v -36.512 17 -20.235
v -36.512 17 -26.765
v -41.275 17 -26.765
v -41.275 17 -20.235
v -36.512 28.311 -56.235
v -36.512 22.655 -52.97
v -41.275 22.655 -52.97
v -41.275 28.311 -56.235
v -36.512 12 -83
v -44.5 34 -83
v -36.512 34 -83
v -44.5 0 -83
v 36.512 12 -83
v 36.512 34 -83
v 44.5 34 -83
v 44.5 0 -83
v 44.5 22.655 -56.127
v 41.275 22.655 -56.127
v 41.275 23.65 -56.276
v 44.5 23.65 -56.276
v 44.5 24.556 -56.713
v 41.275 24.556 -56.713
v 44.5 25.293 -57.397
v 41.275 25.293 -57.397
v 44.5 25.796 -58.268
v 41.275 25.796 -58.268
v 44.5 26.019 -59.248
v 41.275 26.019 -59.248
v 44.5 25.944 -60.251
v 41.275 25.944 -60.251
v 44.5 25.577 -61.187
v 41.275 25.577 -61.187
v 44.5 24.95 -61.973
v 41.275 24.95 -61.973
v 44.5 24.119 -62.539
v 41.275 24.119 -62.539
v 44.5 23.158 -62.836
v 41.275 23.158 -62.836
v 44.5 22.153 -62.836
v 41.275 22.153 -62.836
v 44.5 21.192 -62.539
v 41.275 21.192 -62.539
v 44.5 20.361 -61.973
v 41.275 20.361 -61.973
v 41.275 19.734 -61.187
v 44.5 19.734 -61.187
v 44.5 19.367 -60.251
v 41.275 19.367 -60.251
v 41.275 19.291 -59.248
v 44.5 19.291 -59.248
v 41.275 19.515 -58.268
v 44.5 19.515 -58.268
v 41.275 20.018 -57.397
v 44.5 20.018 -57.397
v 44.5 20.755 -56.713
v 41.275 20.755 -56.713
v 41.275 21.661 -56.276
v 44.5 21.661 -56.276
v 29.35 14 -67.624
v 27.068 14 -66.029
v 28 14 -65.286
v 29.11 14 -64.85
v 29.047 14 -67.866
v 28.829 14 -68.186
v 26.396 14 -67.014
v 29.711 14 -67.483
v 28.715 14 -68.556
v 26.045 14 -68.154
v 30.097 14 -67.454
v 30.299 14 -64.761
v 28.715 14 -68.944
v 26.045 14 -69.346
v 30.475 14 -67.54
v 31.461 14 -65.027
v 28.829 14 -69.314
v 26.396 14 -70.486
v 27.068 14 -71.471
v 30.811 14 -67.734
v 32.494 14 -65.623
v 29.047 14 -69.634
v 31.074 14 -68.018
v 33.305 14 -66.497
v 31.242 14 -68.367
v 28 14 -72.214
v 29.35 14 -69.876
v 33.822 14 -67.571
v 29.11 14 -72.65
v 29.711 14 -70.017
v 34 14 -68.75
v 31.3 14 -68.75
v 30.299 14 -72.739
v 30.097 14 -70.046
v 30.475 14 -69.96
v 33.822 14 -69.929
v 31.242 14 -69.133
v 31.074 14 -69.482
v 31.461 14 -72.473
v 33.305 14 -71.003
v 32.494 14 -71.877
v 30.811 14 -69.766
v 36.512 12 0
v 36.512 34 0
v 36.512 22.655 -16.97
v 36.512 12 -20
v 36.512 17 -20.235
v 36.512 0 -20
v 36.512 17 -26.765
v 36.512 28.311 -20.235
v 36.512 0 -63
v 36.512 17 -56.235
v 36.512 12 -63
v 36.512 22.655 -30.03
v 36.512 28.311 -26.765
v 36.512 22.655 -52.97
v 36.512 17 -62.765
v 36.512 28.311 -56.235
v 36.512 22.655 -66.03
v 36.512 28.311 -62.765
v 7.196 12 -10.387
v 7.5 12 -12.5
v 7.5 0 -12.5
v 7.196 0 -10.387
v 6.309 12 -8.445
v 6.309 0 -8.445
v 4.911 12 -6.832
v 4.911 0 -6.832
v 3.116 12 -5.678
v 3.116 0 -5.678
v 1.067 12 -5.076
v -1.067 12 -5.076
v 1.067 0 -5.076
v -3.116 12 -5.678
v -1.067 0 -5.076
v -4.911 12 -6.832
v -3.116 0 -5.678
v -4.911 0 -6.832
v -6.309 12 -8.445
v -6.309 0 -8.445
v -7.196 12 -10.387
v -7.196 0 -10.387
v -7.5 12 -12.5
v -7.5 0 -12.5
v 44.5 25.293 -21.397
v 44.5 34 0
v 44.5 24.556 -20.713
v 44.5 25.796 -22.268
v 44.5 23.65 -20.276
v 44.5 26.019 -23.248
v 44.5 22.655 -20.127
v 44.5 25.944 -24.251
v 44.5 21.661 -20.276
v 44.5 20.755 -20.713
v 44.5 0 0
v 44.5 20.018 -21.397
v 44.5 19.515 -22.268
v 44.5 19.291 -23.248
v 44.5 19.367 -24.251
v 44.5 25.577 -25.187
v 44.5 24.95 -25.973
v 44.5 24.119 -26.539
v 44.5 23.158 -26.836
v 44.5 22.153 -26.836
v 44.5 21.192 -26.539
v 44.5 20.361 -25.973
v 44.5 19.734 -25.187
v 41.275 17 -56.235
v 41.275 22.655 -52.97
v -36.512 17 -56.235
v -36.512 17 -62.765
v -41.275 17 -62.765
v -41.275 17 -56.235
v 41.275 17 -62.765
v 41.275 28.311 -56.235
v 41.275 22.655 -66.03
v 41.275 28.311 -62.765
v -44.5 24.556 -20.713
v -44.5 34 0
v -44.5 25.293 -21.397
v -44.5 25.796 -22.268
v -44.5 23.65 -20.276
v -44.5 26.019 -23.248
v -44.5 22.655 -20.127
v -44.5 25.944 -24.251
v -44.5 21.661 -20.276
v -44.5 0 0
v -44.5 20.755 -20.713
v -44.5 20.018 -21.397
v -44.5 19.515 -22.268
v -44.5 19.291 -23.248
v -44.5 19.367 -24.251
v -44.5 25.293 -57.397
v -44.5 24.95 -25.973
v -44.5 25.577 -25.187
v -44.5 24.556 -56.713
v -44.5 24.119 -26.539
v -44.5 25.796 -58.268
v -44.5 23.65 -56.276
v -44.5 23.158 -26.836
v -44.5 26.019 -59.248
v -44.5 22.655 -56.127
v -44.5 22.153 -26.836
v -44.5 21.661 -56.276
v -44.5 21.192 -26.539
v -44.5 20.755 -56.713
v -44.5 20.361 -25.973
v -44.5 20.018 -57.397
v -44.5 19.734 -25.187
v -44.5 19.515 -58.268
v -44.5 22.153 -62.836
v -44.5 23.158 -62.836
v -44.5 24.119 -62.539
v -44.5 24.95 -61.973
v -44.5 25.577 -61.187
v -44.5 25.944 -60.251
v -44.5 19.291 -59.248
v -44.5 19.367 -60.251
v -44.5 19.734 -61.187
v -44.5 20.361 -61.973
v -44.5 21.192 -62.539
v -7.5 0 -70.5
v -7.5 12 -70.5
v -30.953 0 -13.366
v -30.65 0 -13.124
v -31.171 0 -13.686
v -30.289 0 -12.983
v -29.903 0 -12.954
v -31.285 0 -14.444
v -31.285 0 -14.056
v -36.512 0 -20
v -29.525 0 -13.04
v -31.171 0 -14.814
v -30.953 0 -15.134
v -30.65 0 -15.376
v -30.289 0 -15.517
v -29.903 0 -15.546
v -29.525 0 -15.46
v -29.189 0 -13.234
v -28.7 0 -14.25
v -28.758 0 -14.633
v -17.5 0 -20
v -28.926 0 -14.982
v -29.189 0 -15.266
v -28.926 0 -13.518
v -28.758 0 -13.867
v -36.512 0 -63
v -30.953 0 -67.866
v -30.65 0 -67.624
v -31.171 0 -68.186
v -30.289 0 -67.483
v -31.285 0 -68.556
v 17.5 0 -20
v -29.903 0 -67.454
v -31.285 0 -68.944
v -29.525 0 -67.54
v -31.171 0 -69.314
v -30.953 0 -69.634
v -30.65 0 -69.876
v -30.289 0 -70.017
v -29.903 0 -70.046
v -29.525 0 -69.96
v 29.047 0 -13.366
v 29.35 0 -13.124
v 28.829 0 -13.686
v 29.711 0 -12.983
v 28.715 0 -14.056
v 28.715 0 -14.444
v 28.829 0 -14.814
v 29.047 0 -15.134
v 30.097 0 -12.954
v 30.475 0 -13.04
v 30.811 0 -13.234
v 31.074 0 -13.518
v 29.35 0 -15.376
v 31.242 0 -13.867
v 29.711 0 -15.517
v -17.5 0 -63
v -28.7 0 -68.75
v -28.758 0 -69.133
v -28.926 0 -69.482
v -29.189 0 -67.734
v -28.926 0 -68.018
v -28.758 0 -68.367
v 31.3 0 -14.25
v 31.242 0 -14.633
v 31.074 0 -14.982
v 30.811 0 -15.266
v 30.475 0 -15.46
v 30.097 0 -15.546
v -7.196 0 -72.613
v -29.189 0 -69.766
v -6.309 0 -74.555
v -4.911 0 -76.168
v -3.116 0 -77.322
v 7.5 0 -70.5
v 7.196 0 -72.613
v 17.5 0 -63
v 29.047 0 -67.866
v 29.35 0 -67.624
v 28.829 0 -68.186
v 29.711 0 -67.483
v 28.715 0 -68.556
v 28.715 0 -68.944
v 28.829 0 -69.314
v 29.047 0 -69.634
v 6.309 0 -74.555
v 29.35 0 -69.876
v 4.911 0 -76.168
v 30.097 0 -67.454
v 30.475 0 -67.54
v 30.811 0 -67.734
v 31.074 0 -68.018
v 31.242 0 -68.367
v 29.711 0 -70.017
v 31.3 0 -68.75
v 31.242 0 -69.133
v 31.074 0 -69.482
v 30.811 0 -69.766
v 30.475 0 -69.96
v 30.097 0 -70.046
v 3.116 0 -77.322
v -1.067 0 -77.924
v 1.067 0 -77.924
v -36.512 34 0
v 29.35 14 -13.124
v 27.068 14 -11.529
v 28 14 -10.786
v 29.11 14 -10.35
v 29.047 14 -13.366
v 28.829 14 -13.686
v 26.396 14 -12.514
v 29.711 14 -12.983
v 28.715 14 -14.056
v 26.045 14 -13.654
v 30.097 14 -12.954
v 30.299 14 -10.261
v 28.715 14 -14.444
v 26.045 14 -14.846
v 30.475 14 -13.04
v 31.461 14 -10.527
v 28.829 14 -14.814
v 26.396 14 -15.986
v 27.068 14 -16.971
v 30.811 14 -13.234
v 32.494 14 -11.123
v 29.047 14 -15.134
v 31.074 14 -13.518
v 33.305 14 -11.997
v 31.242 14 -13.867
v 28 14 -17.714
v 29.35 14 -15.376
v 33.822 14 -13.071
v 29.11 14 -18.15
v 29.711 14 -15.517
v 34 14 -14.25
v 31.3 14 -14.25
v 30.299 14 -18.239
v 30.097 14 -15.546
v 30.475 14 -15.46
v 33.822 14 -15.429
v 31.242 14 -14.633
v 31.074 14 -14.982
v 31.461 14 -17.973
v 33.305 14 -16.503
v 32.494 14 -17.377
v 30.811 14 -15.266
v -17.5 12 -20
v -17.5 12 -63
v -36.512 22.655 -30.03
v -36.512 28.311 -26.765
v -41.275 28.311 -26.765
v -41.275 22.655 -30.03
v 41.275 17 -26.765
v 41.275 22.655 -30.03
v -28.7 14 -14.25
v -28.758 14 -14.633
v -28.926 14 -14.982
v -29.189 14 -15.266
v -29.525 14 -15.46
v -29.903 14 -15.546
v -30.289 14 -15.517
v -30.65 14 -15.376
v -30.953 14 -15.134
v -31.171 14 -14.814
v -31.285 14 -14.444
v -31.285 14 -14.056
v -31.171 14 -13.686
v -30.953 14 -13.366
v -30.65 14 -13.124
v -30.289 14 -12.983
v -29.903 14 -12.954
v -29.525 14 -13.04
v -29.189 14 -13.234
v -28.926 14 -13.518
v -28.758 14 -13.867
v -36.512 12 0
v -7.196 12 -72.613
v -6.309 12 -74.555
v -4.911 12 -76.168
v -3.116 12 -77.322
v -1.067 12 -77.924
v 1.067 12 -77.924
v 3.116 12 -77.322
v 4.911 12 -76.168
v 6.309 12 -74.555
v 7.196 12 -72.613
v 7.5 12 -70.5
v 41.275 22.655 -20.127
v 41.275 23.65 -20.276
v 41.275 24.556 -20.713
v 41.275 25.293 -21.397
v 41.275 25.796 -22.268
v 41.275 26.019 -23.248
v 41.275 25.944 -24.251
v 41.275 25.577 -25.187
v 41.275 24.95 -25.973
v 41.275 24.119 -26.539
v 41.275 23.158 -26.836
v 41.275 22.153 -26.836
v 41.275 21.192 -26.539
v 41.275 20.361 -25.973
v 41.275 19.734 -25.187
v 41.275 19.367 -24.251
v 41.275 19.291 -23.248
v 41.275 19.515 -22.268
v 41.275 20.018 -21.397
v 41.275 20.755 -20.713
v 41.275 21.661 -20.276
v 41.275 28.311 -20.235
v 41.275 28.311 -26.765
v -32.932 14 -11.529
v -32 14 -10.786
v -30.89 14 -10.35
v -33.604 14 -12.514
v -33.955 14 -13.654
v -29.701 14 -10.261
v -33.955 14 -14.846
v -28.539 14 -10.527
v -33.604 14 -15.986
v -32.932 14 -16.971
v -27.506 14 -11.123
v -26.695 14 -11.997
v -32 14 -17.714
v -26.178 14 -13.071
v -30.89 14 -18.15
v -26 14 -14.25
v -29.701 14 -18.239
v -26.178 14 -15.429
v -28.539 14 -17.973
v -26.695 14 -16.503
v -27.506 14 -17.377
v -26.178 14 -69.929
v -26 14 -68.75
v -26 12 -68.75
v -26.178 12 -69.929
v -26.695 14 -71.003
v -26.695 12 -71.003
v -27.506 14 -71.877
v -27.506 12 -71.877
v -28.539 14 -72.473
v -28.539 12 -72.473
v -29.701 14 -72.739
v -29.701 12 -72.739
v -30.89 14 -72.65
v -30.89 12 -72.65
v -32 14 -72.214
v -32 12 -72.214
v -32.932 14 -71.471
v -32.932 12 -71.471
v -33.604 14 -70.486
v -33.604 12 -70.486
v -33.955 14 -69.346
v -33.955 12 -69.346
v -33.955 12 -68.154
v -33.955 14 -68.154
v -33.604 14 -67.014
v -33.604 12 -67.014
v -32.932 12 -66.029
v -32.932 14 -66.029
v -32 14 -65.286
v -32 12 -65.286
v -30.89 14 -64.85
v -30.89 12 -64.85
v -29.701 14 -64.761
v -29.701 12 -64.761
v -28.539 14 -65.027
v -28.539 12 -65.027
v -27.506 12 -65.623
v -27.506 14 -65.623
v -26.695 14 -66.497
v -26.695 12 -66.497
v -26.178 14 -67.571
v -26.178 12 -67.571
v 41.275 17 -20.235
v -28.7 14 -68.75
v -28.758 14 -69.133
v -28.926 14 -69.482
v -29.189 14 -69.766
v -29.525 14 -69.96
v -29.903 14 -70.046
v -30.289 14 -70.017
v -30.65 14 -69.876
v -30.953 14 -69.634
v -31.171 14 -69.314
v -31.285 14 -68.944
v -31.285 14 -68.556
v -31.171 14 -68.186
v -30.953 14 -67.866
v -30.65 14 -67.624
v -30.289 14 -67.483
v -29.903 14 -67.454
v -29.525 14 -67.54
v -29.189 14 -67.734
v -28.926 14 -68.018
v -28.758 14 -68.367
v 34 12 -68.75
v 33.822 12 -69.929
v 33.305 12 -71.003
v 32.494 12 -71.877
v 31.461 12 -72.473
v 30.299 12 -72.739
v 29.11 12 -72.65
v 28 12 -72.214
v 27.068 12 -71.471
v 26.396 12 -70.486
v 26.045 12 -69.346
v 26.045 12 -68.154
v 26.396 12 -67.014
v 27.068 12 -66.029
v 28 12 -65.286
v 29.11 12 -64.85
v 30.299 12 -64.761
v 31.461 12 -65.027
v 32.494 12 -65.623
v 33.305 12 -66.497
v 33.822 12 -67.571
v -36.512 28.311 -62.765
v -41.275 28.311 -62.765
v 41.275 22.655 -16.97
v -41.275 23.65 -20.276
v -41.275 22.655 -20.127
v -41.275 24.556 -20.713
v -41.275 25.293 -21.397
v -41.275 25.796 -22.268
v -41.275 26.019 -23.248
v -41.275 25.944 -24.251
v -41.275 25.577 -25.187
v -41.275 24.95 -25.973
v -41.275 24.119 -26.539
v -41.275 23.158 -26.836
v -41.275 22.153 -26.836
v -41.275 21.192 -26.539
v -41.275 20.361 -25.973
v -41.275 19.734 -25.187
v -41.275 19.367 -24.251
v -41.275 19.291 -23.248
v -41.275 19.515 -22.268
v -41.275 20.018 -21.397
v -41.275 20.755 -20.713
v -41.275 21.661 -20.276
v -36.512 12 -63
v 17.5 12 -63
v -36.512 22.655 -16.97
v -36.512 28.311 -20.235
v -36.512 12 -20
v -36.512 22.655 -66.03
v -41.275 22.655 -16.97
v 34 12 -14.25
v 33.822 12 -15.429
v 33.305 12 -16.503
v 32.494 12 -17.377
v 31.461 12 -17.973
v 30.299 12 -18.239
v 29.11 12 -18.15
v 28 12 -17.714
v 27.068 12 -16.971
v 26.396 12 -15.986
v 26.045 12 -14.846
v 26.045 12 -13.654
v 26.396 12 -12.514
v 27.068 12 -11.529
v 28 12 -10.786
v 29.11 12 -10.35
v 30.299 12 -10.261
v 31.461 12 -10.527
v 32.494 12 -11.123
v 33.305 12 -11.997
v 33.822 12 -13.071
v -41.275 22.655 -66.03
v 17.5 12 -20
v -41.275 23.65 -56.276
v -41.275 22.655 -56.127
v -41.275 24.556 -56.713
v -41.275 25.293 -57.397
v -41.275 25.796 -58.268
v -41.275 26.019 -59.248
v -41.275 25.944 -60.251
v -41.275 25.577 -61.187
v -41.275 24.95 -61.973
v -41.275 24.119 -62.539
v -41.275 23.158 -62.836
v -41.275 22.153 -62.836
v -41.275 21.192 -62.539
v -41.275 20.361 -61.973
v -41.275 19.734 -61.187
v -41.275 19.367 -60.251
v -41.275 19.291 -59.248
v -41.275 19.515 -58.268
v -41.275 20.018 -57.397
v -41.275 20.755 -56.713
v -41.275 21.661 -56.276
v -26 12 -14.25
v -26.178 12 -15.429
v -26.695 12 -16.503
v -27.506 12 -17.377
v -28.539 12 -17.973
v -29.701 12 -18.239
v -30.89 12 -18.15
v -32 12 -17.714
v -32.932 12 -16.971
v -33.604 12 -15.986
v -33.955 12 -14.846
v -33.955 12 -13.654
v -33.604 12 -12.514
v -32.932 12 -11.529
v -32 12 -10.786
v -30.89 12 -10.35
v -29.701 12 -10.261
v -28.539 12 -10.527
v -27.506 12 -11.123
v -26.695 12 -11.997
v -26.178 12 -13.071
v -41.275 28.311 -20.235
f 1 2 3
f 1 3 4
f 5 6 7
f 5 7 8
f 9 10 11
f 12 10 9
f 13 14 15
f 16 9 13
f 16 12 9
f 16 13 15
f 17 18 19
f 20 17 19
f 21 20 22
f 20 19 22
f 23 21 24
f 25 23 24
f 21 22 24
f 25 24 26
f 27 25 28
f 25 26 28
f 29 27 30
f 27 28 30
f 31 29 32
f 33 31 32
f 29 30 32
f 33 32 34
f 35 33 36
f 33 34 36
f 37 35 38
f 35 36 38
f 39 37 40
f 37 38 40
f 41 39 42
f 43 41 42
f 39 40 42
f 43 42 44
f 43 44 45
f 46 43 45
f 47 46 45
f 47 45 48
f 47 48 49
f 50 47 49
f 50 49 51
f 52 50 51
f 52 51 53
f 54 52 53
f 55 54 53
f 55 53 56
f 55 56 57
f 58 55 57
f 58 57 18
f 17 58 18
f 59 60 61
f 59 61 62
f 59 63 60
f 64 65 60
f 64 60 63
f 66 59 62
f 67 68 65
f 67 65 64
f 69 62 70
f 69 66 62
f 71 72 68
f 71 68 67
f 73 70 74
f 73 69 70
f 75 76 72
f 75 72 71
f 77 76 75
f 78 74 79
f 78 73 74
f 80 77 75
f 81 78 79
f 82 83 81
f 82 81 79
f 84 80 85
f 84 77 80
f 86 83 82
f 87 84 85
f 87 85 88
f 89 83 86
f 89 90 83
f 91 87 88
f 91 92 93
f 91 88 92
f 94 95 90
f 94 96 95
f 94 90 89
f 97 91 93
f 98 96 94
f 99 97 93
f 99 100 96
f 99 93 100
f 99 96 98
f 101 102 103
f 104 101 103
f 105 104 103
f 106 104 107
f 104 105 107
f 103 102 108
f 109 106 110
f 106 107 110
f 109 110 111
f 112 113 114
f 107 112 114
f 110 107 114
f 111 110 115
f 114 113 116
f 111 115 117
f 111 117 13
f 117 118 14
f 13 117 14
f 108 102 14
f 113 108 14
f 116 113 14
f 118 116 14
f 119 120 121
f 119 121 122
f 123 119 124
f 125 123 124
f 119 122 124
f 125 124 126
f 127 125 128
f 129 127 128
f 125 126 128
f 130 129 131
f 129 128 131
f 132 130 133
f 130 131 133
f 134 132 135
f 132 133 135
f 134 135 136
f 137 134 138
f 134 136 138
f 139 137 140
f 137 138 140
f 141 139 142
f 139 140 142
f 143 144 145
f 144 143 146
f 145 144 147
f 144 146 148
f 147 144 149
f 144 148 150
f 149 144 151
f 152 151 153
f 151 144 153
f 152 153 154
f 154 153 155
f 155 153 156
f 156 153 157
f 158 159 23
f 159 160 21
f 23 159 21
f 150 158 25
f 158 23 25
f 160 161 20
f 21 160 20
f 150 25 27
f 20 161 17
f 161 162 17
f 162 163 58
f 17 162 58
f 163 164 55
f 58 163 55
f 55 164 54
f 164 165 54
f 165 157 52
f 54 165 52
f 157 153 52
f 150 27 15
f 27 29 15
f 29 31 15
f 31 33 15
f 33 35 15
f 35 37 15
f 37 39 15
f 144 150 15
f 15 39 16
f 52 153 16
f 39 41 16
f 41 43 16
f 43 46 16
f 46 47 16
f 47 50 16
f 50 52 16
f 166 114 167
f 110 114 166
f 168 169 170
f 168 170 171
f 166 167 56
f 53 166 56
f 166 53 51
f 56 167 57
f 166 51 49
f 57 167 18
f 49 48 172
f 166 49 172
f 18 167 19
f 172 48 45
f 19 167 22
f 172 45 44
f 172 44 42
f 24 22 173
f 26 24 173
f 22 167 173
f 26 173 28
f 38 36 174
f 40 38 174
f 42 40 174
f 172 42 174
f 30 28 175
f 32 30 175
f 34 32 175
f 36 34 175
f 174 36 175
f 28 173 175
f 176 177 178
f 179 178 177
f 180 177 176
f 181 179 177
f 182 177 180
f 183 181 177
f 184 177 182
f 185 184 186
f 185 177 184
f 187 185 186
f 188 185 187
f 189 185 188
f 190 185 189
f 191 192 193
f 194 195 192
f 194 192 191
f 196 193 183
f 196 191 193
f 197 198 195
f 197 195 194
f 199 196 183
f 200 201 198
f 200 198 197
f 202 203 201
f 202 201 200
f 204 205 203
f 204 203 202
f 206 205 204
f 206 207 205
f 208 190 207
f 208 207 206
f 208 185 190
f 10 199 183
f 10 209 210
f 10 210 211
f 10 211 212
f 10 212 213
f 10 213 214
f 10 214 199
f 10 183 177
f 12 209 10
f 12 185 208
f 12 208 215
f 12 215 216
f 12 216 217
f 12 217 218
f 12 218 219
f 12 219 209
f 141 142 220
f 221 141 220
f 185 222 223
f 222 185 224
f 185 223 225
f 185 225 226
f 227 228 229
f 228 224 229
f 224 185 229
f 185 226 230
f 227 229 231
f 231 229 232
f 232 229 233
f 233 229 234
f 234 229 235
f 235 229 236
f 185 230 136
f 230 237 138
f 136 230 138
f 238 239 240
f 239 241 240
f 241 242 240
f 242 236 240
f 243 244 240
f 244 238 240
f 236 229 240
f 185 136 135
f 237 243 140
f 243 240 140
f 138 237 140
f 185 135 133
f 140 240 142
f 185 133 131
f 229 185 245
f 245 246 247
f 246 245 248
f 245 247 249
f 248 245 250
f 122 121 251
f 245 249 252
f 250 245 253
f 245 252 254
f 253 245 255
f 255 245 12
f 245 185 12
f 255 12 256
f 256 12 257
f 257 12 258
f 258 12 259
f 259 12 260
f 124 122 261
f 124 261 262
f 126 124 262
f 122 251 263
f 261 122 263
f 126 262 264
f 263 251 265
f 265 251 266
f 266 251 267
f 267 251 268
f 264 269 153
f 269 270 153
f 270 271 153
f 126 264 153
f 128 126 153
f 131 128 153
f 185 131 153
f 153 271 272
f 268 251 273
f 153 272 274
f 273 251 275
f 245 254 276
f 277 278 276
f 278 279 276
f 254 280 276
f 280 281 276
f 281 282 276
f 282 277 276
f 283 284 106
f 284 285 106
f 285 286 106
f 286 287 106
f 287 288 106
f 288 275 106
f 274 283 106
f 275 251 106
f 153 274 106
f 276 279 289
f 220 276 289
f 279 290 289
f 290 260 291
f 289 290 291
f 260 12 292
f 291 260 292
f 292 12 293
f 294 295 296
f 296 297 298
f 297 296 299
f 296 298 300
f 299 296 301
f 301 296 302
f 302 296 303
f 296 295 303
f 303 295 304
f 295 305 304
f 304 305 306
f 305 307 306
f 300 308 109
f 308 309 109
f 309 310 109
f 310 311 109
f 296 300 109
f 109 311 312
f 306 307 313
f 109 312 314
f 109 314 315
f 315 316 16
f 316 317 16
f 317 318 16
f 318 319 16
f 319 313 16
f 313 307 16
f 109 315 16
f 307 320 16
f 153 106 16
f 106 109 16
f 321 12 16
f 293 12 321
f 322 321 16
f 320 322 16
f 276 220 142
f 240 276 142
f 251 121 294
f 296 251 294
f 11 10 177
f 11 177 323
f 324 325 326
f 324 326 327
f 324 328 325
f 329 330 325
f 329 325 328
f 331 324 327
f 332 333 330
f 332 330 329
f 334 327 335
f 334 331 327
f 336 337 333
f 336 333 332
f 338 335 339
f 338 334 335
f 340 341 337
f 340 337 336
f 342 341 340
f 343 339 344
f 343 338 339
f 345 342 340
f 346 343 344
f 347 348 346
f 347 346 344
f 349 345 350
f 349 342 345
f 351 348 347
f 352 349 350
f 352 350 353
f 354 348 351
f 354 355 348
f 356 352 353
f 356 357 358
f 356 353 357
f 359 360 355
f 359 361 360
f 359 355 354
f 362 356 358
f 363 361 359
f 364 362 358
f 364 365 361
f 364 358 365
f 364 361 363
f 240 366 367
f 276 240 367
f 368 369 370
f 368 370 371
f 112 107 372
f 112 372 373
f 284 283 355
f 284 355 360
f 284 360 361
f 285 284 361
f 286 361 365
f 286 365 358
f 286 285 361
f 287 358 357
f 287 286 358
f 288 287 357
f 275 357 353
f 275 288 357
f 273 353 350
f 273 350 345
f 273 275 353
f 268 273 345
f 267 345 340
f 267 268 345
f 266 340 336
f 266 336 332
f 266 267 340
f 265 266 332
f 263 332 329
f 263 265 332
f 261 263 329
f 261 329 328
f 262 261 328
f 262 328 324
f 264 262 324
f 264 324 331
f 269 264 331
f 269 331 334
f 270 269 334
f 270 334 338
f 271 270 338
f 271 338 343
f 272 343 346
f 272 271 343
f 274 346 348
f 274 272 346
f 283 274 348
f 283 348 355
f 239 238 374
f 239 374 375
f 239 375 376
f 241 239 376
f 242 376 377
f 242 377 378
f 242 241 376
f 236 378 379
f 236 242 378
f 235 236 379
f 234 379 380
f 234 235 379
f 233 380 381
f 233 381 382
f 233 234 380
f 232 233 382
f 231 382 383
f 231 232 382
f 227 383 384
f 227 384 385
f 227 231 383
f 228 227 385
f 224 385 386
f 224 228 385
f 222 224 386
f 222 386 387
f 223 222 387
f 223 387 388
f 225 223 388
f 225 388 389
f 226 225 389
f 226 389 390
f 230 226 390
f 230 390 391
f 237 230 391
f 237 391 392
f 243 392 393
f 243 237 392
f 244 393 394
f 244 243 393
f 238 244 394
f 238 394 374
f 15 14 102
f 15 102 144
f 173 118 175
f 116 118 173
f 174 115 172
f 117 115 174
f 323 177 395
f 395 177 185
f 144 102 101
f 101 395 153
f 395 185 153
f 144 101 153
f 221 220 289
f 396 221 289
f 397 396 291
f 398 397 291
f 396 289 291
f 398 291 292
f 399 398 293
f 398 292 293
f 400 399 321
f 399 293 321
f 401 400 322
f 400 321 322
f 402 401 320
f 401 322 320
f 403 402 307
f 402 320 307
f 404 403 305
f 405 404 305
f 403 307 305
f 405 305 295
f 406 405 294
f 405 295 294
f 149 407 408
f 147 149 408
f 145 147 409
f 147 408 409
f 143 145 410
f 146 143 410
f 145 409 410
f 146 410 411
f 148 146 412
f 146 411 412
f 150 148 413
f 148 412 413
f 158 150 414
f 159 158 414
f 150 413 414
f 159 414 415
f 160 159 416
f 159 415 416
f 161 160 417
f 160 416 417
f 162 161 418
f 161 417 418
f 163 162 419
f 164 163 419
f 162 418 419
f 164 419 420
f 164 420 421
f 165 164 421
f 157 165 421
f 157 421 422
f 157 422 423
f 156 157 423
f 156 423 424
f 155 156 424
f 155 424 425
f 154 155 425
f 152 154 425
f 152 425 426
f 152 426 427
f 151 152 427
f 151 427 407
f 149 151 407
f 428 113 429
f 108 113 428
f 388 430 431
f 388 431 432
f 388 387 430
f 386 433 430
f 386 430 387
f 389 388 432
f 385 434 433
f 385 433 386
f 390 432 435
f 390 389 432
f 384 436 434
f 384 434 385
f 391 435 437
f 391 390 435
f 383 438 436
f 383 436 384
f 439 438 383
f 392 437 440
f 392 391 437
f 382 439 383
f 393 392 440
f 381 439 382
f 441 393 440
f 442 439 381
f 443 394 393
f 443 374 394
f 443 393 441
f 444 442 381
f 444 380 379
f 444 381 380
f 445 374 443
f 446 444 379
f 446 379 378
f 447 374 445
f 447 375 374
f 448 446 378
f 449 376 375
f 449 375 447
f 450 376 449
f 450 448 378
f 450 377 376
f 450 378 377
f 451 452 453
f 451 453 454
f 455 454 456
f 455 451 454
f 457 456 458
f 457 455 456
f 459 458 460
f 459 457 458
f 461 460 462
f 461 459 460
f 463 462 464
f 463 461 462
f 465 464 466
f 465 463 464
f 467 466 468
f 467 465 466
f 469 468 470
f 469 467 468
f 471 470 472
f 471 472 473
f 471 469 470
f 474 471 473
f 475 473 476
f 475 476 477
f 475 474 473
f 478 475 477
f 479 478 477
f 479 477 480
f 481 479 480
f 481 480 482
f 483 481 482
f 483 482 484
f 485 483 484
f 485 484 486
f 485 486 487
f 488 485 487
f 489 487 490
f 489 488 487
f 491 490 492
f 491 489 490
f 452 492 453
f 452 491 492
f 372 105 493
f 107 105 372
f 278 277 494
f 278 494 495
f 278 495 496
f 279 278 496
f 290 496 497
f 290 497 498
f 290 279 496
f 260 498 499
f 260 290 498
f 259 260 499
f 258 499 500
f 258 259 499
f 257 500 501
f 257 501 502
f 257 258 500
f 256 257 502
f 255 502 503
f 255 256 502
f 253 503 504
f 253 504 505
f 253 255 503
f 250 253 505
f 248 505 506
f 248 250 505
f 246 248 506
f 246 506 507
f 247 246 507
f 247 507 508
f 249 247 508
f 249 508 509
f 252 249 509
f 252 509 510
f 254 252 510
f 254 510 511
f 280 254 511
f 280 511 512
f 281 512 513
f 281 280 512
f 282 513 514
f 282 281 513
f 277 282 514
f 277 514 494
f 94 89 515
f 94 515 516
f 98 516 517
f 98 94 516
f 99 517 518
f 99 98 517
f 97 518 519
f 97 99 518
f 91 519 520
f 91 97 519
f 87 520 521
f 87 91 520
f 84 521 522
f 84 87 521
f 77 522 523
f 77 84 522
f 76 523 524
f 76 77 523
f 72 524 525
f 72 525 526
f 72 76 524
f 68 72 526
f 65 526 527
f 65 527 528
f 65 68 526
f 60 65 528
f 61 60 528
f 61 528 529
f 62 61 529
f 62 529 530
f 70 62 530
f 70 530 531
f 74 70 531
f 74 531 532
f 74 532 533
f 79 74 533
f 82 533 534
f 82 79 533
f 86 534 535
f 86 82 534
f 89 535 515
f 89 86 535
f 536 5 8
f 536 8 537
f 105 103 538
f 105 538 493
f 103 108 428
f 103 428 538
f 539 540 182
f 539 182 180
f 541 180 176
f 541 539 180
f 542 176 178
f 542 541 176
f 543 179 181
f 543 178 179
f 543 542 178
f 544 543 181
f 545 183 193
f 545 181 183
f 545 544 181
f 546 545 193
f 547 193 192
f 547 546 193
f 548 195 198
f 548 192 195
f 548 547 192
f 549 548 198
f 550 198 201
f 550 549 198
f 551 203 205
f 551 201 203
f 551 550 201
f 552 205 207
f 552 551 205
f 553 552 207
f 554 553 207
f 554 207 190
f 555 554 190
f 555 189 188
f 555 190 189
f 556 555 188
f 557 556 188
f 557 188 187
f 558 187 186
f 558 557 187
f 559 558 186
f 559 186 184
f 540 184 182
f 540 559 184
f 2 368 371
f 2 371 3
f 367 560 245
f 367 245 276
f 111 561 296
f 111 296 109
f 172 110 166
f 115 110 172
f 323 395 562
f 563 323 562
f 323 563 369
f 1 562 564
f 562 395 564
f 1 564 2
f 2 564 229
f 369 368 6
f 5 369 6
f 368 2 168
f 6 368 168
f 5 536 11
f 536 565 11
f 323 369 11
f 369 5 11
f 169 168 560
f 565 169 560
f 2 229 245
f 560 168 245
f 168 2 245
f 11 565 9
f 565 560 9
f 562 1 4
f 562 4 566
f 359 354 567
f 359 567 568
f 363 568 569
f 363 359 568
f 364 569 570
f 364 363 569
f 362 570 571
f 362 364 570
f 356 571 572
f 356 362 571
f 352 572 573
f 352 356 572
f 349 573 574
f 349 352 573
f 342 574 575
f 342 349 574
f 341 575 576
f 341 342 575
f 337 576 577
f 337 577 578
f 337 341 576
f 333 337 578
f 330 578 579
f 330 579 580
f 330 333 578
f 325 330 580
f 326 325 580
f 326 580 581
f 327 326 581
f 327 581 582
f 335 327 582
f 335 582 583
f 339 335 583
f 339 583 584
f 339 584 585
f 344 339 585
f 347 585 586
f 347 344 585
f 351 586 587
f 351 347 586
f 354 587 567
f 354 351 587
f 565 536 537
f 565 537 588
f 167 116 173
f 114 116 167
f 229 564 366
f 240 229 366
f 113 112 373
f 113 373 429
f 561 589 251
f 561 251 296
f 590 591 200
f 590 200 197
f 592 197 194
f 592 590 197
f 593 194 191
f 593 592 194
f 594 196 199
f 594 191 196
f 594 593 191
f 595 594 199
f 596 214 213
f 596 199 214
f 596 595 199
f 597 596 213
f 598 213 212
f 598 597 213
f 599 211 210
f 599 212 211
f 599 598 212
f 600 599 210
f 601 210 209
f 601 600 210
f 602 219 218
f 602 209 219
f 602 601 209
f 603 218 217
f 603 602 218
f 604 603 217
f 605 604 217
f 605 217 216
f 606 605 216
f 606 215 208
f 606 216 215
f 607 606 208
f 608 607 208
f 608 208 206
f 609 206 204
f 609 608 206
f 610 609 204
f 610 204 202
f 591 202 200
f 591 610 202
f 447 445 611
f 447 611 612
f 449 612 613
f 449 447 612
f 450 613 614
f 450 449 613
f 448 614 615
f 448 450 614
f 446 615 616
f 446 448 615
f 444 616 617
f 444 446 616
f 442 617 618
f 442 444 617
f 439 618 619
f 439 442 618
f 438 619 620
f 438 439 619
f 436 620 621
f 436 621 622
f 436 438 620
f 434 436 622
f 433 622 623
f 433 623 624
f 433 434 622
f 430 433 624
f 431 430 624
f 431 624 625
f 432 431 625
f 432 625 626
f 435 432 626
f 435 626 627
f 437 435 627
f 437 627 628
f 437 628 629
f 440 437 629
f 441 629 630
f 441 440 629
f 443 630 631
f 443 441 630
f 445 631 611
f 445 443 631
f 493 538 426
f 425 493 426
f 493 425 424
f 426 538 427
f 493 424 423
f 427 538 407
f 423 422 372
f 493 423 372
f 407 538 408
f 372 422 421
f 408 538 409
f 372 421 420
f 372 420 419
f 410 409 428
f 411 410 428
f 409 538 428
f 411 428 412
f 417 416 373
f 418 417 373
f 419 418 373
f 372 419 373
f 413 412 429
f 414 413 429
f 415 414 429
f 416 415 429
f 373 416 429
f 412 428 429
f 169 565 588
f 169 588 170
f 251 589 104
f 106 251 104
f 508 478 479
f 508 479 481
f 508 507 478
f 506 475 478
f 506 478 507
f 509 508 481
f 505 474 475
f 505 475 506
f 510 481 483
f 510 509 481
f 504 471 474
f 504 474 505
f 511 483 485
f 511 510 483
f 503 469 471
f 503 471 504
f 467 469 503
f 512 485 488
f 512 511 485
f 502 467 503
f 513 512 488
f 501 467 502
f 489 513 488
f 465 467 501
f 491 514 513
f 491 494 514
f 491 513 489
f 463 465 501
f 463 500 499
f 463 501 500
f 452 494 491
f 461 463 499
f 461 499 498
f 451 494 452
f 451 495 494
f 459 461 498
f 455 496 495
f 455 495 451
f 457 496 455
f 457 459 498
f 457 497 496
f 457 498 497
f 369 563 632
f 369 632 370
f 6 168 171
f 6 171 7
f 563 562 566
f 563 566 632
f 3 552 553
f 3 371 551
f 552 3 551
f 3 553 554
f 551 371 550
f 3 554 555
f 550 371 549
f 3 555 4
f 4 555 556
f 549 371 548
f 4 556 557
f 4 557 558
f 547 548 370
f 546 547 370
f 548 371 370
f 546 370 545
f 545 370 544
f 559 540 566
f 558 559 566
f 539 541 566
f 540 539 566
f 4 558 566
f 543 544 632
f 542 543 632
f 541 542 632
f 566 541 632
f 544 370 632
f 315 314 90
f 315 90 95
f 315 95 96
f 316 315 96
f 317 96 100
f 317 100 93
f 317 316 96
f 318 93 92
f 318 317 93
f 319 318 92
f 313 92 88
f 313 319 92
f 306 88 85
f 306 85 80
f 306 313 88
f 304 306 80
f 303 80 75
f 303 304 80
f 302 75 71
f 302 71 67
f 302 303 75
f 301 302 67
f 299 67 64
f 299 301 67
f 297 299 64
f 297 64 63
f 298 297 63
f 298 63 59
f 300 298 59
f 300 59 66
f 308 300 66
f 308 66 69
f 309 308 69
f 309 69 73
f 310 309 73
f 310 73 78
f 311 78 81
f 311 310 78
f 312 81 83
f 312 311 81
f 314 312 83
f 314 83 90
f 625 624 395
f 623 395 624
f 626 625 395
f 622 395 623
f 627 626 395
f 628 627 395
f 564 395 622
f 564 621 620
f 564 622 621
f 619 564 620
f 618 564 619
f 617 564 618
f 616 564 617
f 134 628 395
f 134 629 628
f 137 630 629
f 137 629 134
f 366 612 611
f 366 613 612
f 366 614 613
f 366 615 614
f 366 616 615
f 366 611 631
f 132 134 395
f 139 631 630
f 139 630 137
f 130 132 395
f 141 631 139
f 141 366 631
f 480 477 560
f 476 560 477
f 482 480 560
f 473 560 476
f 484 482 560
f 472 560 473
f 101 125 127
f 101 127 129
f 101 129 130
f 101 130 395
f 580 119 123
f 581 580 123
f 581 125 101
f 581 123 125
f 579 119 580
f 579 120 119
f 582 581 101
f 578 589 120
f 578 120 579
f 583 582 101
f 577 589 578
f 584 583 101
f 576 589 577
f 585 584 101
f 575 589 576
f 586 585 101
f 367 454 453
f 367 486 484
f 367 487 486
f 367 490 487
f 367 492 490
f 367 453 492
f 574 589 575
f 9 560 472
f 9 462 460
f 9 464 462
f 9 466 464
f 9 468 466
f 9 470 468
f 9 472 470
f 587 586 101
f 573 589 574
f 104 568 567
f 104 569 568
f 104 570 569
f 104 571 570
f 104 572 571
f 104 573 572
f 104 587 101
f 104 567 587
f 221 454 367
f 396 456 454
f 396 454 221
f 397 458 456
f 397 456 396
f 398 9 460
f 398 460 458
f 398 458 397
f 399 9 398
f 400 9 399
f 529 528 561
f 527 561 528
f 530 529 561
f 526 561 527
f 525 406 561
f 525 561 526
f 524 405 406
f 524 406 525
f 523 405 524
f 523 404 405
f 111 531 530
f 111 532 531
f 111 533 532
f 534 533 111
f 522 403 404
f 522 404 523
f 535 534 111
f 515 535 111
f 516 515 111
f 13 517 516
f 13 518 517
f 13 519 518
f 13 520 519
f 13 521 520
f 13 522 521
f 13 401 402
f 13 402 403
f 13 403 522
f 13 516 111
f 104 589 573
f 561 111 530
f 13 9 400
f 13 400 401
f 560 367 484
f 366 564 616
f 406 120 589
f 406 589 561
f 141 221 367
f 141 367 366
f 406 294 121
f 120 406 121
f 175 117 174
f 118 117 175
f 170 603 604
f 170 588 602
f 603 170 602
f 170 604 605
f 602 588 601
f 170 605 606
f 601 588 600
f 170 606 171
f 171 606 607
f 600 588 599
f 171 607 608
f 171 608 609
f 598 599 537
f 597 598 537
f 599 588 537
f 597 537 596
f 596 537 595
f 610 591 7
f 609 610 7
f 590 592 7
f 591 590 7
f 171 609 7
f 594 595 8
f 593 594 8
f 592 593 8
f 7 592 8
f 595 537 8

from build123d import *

# Parameters (mm, degrees)
SKETCH1_W                   = 89
SKETCH1_H                   = 83
SKETCH1_R                   = 1.3
MAIN_BODY_DEPTH             = 14
SKETCH2_W                   = 73.025
SKETCH2_H                   = 83
SKETCH2_R                   = 4
SCREW_RISER_DEPTH           = 2
SKETCH4_W                   = 7.9875
SKETCH4_H                   = 83
TOPPER_SUPPORT_DEPTH        = 20
MOUNT_START                 = -44.5
MOUNT_NUTS_DEPTH            = 41.275
F_9_32_MOUNT_HOLES_REACH    = 9.988
SKETCH5_R                   = 3.3734375
SKETCH8_W                   = 19.0125
SKETCH8_H                   = 43
MIDDLE_CUT_DEPTH            = 14
SKETCH9_R                   = 3.3734375
MOUNT_NUTS_P2_DEPTH         = 4.7625
SKETCH9_3_R                 = 3.3734375
F_9_32_MOUNT_HOLES_P2_DEPTH = 7.9875


with BuildPart() as part:
    # Sketch1 → Main Body (new body)
    with BuildSketch(Plane(origin=(0, 0, 0), x_dir=(1, 0, 0), z_dir=(0, 1, 0))):
        with Locations((0, 41.5)):
            Rectangle(SKETCH1_W, SKETCH1_H)
        with Locations((-30, 14.25)):
            Circle(SKETCH1_R, mode=Mode.SUBTRACT)
        with Locations((30, 14.25)):
            Circle(SKETCH1_R, mode=Mode.SUBTRACT)
        with BuildLine():
            Line((-7.5, 12.5), (-7.5, 70.5))
            ThreePointArc((-7.5, 70.5), (0, 78), (7.5, 70.5))
            Line((7.5, 70.5), (7.5, 12.5))
            ThreePointArc((7.5, 12.5), (0, 5), (-7.5, 12.5))
        make_face(mode=Mode.SUBTRACT)
        with Locations((-30, 68.75)):
            Circle(SKETCH1_R, mode=Mode.SUBTRACT)
        with Locations((30, 68.75)):
            Circle(SKETCH1_R, mode=Mode.SUBTRACT)
    extrude(amount=MAIN_BODY_DEPTH)

    # Sketch2 → Screw Riser (cut)
    with BuildSketch(Plane(origin=(0, 14, 0), x_dir=(1, 0, 0), z_dir=(0, 1, 0))):
        with Locations((0, 41.5)):
            Rectangle(SKETCH2_W, SKETCH2_H)
        with Locations((-30, 14.25)):
            Circle(SKETCH2_R, mode=Mode.SUBTRACT)
        with Locations((30, 14.25)):
            Circle(SKETCH2_R, mode=Mode.SUBTRACT)
        with Locations((-30, 68.75)):
            Circle(SKETCH2_R, mode=Mode.SUBTRACT)
        with Locations((30, 68.75)):
            Circle(SKETCH2_R, mode=Mode.SUBTRACT)
    extrude(amount=-SCREW_RISER_DEPTH, mode=Mode.SUBTRACT)

    # Sketch4 → Topper Support (add)
    with BuildSketch(Plane(origin=(0, 14, 0), x_dir=(1, 0, 0), z_dir=(0, 1, 0))):
        with Locations((-40.50625, 41.5)):
            Rectangle(SKETCH4_W, SKETCH4_H)
        with Locations((40.50625, 41.5)):
            Rectangle(SKETCH4_W, SKETCH4_H)
    extrude(amount=TOPPER_SUPPORT_DEPTH)

    # Sketch6 → Mount Nuts (cut)
    with BuildSketch(Plane.ZY.offset(44.5).offset(MOUNT_START)):
        Polygon((-52.96962719, 22.65546875), (-56.234813595, 28.3109375), (-62.765186405, 28.3109375), (-66.03037281, 22.65546875), (-62.765186405, 17), (-56.234813595, 17), align=None)
        Polygon((-16.96962719, 22.65546875), (-20.234813595, 28.3109375), (-26.765186405, 28.3109375), (-30.03037281, 22.65546875), (-26.765186405, 17), (-20.234813595, 17), align=None)
    extrude(amount=MOUNT_NUTS_DEPTH, mode=Mode.SUBTRACT)

    # Sketch5 → 9/32 Mount Holes (cut, up to next)
    with BuildSketch(Plane.ZY.offset(36.5125), mode=Mode.PRIVATE) as f_9_32_mount_holes_sk1:
        with Locations((-59.5, 22.65546875)):
            Circle(SKETCH5_R)
    f_9_32_mount_holes_tool1 = extrude(f_9_32_mount_holes_sk1.sketch, amount=F_9_32_MOUNT_HOLES_REACH, mode=Mode.PRIVATE) & part.part
    add(f_9_32_mount_holes_tool1.solids().sort_by_distance((-36.5125, 22.655469, -59.5))[0], mode=Mode.SUBTRACT)
    # Sketch5 → 9/32 Mount Holes (cut, up to next)
    with BuildSketch(Plane.ZY.offset(36.5125), mode=Mode.PRIVATE) as f_9_32_mount_holes_sk2:
        with Locations((-23.5, 22.65546875)):
            Circle(SKETCH5_R)
    f_9_32_mount_holes_tool2 = extrude(f_9_32_mount_holes_sk2.sketch, amount=F_9_32_MOUNT_HOLES_REACH, mode=Mode.PRIVATE) & part.part
    add(f_9_32_mount_holes_tool2.solids().sort_by_distance((-36.5125, 22.655469, -23.5))[0], mode=Mode.SUBTRACT)

    # Sketch8 → Middle Cut (cut)
    with BuildSketch(Plane(origin=(0, 14, 0), x_dir=(1, 0, 0), z_dir=(0, 1, 0))):
        with Locations((-27.00625, 41.5)):
            Rectangle(SKETCH8_W, SKETCH8_H)
        with Locations((27.00625, 41.5)):
            Rectangle(SKETCH8_W, SKETCH8_H)
    extrude(amount=-MIDDLE_CUT_DEPTH, mode=Mode.SUBTRACT)

    # Sketch9 → Mount Nuts p2 (cut)
    with BuildSketch(Plane.ZY.offset(-36.5125)):
        Polygon((-56.234813595, 17), (-62.765186405, 17), (-66.03037281, 22.65546875), (-62.765186405, 28.3109375), (-56.234813595, 28.3109375), (-52.96962719, 22.65546875), align=None)
        with Locations((-59.5, 22.65546875)):
            Circle(SKETCH9_R, mode=Mode.SUBTRACT)
        with Locations((-59.5, 22.65546875)):
            Circle(SKETCH9_R)
        Polygon((-20.234813595, 17), (-26.765186405, 17), (-30.03037281, 22.65546875), (-26.765186405, 28.3109375), (-20.234813595, 28.3109375), (-16.96962719, 22.65546875), align=None)
        with Locations((-23.5, 22.65546875)):
            Circle(SKETCH9_R, mode=Mode.SUBTRACT)
        with Locations((-23.5, 22.65546875)):
            Circle(SKETCH9_R)
    extrude(amount=-MOUNT_NUTS_P2_DEPTH, mode=Mode.SUBTRACT)

    # Sketch9<3> → 9/32 Mount Holes p2 (cut)
    with BuildSketch(Plane.ZY.offset(-36.5125)):
        with Locations((-59.5, 22.65546875)):
            Circle(SKETCH9_3_R)
        with Locations((-23.5, 22.65546875)):
            Circle(SKETCH9_3_R)
    extrude(amount=-F_9_32_MOUNT_HOLES_P2_DEPTH, mode=Mode.SUBTRACT)


solid = part.part
